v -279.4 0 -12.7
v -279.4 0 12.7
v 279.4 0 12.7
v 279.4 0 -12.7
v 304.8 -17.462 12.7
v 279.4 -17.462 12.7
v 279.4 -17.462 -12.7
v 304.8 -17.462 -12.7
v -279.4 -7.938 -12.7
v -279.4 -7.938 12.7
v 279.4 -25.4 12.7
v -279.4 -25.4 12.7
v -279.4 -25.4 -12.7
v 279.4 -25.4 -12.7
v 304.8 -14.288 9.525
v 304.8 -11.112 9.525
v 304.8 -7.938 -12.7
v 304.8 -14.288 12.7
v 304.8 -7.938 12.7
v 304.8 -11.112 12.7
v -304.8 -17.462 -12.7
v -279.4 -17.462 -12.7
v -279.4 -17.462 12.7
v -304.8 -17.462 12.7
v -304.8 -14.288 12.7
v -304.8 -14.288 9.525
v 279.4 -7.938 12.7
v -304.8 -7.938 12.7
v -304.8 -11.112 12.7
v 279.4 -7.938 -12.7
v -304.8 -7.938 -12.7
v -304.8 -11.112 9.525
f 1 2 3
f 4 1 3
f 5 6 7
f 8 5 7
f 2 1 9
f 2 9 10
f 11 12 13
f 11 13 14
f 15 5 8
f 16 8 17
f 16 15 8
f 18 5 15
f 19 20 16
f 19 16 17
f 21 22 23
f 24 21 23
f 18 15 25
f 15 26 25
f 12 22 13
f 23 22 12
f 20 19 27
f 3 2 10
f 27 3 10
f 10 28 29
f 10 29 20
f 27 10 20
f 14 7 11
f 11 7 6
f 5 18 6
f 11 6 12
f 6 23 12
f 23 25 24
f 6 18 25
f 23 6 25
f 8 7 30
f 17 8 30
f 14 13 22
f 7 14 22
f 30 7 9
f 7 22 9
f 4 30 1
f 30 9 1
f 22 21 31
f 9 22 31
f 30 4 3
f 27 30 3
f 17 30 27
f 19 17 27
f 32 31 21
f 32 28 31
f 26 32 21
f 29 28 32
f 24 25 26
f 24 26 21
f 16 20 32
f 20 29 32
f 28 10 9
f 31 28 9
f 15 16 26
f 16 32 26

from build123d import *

# Parameters (mm, degrees)
F0_W     = 558.8
F0_H     = 25.4
F1_DEPTH = 25.4
F2_W     = 558.8
F2_H     = 3.175
F3_DEPTH = 3.175
F5_DEPTH = 25.4
F7_DEPTH = 25.4


with BuildPart() as f1:
    # F0 (on Front) → F1 (new body)
    with BuildSketch(Plane.XZ):
        Rectangle(F0_W, F0_H)
    extrude(amount=F1_DEPTH)

    # F2 (on face) → F3 (cut)
    with BuildSketch(Plane.XY.offset(12.7)):
        with Locations((0, -12.7)):
            Rectangle(F2_W, F2_H)
    extrude(amount=-F3_DEPTH, mode=Mode.SUBTRACT)

    # F4 (on face) → F5 (join)
    with BuildSketch(Plane(origin=(-279.4, 0, 0), x_dir=(0, -1, 0), z_dir=(-1, 0, 0))):
        Polygon((7.9375, -12.7), (17.4625, -12.7), (17.4625, 12.7), (14.2875, 12.7), (14.2875, 9.525), (11.1125, 9.525), (11.1125, 12.7), (7.9375, 12.7), align=None)
    extrude(amount=F5_DEPTH)

    # F6 (on face) → F7 (join)
    with BuildSketch(Plane.YZ.offset(279.4)):
        Polygon((-17.4625, -12.7), (-7.9375, -12.7), (-7.9375, 12.7), (-11.1125, 12.7), (-11.1125, 9.525), (-14.2875, 9.525), (-14.2875, 12.7), (-17.4625, 12.7), align=None)
    extrude(amount=F7_DEPTH)


solid = f1.part
